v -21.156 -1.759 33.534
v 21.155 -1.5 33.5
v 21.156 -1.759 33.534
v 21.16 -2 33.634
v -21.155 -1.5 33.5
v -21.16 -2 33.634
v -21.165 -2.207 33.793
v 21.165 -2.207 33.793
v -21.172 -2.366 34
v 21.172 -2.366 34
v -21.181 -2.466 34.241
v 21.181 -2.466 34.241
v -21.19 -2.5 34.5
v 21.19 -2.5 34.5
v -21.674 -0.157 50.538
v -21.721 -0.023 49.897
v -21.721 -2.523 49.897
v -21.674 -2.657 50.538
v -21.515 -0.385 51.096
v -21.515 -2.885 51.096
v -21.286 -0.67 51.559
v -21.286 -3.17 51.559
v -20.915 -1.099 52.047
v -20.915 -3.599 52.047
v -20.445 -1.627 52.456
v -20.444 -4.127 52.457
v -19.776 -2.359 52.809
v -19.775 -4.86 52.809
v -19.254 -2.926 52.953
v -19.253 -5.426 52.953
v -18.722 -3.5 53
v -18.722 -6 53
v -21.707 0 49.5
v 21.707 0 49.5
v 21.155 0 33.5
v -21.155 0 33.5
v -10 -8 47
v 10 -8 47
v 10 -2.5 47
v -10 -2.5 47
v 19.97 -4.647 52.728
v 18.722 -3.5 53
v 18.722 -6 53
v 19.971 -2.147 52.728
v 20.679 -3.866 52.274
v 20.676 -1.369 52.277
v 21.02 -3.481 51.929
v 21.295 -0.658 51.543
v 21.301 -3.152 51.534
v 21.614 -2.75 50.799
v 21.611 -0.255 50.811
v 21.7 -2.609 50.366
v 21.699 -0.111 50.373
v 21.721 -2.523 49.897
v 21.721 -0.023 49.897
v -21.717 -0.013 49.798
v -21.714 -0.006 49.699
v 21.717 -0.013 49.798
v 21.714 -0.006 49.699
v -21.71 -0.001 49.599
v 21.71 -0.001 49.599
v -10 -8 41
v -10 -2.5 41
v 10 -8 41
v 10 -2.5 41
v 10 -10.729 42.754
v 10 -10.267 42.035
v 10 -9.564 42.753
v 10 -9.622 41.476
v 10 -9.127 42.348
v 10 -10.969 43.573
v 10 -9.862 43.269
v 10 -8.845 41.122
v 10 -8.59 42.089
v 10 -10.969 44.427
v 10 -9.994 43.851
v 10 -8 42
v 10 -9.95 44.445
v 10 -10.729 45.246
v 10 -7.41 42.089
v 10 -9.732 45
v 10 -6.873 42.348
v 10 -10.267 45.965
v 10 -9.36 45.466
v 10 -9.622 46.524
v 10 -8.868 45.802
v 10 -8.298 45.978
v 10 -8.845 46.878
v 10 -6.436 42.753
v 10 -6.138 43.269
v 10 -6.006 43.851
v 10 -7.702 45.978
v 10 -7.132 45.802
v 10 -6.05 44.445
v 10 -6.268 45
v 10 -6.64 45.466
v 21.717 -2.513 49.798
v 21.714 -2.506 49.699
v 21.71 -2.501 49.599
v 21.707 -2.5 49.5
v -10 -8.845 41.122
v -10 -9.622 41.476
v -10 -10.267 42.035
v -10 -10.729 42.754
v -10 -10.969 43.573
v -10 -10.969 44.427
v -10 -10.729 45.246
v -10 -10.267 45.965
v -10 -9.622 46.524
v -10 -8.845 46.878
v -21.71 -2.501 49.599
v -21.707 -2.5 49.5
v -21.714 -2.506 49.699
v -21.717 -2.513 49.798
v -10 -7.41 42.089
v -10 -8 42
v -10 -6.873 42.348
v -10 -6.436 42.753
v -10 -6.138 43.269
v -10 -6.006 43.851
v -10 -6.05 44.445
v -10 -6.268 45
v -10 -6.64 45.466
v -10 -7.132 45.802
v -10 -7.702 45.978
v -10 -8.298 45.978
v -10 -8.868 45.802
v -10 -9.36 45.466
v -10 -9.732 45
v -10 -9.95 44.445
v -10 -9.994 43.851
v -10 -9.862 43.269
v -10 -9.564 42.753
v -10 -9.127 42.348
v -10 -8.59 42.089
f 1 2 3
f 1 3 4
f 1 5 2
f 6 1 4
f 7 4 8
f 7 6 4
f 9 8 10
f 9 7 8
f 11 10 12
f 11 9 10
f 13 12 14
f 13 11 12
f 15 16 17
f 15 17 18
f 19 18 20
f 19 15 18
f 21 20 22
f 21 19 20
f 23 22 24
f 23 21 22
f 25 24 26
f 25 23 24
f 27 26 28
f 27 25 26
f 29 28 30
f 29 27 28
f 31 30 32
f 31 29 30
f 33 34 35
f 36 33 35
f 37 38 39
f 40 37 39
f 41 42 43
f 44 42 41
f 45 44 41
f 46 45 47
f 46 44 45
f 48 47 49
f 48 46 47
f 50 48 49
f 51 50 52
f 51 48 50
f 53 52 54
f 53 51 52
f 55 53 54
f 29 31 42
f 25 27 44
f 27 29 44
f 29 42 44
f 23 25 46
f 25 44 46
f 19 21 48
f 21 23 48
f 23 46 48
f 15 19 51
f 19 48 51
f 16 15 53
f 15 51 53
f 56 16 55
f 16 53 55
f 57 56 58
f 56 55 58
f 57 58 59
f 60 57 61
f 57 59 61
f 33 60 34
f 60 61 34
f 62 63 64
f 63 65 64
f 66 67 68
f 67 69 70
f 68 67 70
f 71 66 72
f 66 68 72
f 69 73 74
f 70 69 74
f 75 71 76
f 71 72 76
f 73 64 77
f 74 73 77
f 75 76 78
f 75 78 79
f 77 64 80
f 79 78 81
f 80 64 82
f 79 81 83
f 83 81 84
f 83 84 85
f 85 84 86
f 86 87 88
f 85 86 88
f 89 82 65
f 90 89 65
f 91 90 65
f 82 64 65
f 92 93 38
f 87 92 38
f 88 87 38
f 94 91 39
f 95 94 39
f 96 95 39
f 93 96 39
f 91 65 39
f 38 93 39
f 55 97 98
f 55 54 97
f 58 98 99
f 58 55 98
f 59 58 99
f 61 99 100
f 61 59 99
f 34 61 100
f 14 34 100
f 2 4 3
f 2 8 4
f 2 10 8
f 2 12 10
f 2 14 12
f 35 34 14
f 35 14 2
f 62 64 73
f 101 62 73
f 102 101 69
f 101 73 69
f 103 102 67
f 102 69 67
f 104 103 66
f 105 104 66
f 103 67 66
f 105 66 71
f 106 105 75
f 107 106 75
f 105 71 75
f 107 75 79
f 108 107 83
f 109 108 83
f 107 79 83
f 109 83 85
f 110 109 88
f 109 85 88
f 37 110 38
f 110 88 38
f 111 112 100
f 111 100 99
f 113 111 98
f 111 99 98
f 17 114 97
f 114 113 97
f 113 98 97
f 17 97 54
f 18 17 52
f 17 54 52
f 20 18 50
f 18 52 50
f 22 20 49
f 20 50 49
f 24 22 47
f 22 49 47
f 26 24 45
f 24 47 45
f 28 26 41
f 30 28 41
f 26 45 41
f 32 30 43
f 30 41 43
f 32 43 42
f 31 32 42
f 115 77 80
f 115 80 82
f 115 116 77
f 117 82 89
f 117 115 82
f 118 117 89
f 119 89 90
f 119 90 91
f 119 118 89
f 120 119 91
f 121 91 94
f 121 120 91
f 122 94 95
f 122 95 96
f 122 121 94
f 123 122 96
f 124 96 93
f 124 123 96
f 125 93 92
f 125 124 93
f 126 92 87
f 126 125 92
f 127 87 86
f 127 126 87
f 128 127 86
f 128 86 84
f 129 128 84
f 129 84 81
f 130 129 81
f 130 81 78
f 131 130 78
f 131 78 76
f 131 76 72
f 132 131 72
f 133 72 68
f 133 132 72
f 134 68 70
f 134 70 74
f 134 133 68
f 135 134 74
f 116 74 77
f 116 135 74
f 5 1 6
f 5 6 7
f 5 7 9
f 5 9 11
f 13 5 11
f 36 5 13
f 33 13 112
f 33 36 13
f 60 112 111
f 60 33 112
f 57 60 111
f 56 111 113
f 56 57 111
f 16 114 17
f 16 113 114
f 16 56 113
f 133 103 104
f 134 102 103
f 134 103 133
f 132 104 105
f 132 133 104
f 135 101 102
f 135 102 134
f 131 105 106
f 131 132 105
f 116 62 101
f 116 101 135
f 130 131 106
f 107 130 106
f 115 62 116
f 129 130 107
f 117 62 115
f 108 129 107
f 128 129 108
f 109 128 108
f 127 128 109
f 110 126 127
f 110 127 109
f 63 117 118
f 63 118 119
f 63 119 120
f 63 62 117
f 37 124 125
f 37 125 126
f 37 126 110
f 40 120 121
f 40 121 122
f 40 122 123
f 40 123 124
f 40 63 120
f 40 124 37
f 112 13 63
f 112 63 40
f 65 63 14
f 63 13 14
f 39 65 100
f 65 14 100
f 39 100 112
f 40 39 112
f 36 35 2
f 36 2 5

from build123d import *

# Parameters (mm, degrees)
EXTRUDE_1_DEPTH     = 22
SKETCH_2_W          = 44
SKETCH_2_H          = 58
CUT_EXTRUDE_1_DEPTH = 7
FILLET_1_R          = 1
SKETCH_3_R          = 2
EXTRUDE_2_DEPTH     = 10


with BuildPart() as part:
    # Эскиз1 → Бобышка-Вытянуть1 (new, symmetric)
    with BuildSketch(Plane(origin=(0, 0, 0), x_dir=(0, 0, -1), z_dir=(1, 0, 0))):
        with BuildLine():
            Line((-49.5, 0), (0, 0))
            Line((0, 0), (0, -2.5))
            Line((0, -2.5), (-49.5, -2.5))
            ThreePointArc((-49.5, -2.5), (-51.974873734, -3.525126266), (-53, -6))
            Line((-53, -6), (-53, -3.5))
            ThreePointArc((-53, -3.5), (-51.974873734, -1.025126266), (-49.5, 0))
        make_face()
    extrude(amount=EXTRUDE_1_DEPTH, both=True)

    # Эскиз2 → Вырез-Вытянуть1 (cut)
    with BuildSketch(Plane(origin=(0, 0, 0), x_dir=(1, 0, 0), z_dir=(0, 1, 0))):
        with Locations((0, -29)):
            Rectangle(SKETCH_2_W, SKETCH_2_H)
        with BuildLine():
            Line((21.155172414, -33.5), (-21.155172414, -33.5))
            Line((-21.155172414, -33.5), (-21.720572868, -49.896613172))
            ThreePointArc((-21.720572868, -49.896613172), (-20.879918366, -52.084447111), (-18.72235487, -53))
            Line((-18.72235487, -53), (18.72235487, -53))
            ThreePointArc((18.72235487, -53), (20.879918366, -52.084447111), (21.720572868, -49.896613172))
            Line((21.720572868, -49.896613172), (21.155172414, -33.5))
        make_face(mode=Mode.SUBTRACT)
    extrude(amount=-CUT_EXTRUDE_1_DEPTH, mode=Mode.SUBTRACT)

    # Скругление1
    fillet_1_edges = [part.edges().sort_by_distance(p)[0] for p in [
        (0, -2.5, 33.5),
    ]]
    fillet(fillet_1_edges, radius=FILLET_1_R)

    # Эскиз3 → Бобышка-Вытянуть2 (add, symmetric)
    with BuildSketch(Plane(origin=(0, 0, 0), x_dir=(0, 0, -1), z_dir=(1, 0, 0))):
        with BuildLine():
            Line((-47, -8), (-47, -2.5))
            Line((-47, -2.5), (-41, -2.5))
            Line((-41, -2.5), (-41, -8))
            ThreePointArc((-41, -8), (-44, -11), (-47, -8))
        make_face()
        with Locations((-44, -8)):
            Circle(SKETCH_3_R, mode=Mode.SUBTRACT)
    extrude(amount=EXTRUDE_2_DEPTH, both=True)


solid = part.part
